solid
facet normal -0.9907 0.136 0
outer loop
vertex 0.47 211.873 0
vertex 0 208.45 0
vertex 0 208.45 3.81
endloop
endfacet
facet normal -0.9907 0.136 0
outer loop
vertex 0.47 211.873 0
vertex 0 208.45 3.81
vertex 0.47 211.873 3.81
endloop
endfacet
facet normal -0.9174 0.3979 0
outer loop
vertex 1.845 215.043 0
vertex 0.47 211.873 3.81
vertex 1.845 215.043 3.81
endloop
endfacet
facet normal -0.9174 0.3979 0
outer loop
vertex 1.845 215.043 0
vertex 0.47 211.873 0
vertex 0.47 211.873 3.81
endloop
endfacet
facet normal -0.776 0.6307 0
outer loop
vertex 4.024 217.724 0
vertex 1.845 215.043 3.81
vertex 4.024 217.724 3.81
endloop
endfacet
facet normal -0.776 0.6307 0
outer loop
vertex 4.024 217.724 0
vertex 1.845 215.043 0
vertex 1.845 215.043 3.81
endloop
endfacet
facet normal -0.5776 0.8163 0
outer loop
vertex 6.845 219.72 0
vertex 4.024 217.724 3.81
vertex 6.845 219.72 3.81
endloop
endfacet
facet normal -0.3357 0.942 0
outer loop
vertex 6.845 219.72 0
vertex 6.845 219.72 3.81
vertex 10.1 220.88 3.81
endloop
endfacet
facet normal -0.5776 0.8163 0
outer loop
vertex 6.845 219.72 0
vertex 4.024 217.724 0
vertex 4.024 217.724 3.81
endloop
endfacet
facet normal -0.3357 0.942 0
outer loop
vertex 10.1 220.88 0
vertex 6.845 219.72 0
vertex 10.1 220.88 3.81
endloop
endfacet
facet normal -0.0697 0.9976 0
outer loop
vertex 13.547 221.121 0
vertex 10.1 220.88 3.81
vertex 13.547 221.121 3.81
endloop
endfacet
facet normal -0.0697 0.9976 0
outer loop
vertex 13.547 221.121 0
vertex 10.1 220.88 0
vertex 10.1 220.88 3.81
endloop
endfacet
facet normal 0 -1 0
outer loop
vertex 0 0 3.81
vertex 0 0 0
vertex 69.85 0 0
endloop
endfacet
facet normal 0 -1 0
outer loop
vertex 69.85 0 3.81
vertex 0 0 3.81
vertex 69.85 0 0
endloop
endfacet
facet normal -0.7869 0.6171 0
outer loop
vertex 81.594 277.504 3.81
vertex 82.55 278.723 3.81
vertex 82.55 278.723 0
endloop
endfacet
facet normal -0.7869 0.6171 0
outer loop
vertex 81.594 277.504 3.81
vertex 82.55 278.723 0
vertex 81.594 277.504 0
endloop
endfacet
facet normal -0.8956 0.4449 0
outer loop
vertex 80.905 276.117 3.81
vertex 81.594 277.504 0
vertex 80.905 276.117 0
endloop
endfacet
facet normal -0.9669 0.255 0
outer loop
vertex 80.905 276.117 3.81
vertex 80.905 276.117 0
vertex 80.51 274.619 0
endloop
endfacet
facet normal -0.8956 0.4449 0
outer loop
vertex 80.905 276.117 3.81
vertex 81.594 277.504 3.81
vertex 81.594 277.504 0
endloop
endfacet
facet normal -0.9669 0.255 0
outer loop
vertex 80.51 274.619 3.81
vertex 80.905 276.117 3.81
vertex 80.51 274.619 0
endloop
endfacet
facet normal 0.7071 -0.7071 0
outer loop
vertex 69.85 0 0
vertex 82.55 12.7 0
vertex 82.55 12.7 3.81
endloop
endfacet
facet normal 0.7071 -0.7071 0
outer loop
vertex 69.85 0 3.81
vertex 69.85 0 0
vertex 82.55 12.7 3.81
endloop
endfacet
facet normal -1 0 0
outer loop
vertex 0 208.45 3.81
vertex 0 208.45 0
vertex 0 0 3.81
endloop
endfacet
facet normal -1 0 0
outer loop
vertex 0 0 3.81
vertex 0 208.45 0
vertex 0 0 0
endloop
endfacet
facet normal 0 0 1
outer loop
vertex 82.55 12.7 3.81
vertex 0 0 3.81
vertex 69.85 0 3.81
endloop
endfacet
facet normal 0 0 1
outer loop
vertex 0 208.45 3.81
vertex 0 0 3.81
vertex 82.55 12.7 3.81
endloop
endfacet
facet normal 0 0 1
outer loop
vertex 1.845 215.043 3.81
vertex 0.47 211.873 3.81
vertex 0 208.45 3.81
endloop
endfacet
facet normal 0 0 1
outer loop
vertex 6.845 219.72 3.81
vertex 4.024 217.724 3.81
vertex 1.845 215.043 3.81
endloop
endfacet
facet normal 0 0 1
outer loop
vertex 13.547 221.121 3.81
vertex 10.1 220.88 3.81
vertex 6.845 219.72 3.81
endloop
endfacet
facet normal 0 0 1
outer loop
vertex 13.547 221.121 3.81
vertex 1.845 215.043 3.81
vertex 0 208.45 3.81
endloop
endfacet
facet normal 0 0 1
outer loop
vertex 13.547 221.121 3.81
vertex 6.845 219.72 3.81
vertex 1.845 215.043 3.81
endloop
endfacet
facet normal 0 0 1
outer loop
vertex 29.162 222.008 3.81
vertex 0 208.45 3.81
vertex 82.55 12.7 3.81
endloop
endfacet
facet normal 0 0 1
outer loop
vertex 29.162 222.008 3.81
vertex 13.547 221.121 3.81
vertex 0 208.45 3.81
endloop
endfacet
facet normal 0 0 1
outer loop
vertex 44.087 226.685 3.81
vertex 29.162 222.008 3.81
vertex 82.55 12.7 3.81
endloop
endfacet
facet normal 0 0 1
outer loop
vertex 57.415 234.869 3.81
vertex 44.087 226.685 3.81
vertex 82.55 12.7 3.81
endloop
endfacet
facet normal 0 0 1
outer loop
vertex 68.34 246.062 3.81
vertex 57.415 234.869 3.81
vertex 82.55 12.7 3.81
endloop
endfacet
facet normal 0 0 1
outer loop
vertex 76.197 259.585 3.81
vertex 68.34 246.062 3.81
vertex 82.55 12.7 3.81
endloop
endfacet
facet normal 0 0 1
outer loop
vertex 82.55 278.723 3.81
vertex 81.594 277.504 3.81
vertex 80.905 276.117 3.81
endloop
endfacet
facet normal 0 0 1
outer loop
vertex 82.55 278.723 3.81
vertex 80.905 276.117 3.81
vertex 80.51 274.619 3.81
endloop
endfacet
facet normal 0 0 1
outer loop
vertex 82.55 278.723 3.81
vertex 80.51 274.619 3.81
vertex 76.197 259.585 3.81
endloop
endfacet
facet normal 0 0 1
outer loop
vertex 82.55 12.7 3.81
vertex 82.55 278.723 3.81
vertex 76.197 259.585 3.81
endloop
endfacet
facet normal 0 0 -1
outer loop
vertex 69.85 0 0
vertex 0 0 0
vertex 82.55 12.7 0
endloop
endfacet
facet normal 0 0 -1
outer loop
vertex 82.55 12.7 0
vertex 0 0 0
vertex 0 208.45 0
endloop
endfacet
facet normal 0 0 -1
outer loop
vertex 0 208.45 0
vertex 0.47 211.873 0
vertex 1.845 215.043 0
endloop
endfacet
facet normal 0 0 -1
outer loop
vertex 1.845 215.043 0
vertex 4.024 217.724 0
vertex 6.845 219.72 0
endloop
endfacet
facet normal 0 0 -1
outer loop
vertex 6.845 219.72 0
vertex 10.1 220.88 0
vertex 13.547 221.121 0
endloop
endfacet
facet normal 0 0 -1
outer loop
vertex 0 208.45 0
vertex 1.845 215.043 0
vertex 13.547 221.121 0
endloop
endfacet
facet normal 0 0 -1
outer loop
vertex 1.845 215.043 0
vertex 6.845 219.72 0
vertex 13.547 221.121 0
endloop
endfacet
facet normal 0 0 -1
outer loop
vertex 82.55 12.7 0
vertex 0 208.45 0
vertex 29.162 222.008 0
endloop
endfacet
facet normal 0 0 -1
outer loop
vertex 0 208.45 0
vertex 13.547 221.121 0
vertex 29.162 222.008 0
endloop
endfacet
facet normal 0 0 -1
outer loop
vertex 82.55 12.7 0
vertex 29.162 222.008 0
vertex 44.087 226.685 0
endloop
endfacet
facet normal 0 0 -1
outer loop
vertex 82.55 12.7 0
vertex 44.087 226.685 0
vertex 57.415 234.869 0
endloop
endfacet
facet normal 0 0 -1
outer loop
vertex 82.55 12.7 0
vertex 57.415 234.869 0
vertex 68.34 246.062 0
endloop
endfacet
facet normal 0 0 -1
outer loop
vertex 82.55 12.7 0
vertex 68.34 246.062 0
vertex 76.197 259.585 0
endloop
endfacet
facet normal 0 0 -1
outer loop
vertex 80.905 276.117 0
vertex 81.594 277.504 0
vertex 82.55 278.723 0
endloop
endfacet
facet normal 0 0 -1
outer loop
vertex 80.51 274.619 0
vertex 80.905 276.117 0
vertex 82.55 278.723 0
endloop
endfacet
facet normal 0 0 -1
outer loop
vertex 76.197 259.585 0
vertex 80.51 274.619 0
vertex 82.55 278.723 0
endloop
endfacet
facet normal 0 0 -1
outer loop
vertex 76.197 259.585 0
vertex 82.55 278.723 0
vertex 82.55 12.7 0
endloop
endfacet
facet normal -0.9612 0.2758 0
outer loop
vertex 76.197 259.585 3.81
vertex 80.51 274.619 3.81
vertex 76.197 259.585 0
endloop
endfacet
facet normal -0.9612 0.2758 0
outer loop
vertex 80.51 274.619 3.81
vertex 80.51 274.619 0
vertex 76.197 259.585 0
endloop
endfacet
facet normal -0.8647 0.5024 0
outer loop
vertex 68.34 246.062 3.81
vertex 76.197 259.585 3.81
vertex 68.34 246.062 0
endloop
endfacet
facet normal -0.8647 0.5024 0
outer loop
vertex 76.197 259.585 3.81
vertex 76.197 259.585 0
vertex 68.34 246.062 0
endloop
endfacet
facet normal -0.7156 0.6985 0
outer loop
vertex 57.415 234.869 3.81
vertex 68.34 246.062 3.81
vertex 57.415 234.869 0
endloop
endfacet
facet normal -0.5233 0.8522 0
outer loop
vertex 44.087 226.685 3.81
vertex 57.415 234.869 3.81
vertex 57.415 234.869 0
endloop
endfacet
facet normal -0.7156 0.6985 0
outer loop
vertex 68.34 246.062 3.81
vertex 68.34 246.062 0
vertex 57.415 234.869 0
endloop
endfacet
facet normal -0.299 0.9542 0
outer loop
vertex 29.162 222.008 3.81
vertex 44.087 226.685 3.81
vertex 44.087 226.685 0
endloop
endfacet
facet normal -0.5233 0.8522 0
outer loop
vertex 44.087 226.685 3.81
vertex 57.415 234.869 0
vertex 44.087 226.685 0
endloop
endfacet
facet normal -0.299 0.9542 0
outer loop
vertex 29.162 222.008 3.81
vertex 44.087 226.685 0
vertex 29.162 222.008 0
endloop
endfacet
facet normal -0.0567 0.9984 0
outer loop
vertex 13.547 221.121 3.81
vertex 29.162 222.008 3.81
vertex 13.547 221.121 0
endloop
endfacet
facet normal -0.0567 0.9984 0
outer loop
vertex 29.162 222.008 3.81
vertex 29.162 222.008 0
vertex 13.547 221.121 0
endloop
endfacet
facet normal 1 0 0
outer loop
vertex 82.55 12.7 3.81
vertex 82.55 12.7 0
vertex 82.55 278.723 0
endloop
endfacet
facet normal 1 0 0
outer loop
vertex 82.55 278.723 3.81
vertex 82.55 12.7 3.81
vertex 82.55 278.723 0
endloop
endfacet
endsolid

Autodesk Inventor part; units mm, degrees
ref_plane "YZ Plane" through (0, 0, 0) normal (1, 0, 0) x (0, 1, 0)
ref_plane "XZ Plane" through (0, 0, 0) normal (0, 1, 0) x (-1, 0, 0)
ref_plane "XY Plane" through (0, 0, 0) normal (0, 0, 1) x (1, 0, 0)
sketch "Sketch1" plane through (0, 0, 0) normal (0, 0, 1) x (1, 0, 0)
  line L0 (0, 0) -> (82.55, 0)
  line L1 (82.55, 0) -> (82.55, 304.8)
  line L2 (82.55, 304.8) -> (0, 304.8)
  line L3 (0, 304.8) -> (0, 0)
  dimension "d0" = 82.55
  dimension "d1" = 304.8
extrude "Extrusion1" add sketch "Sketch1" along normal blind 3.81
chamfer "Chamfer1" distance 12.7 angle 45 1 edges at (82.55, 0, 1.905)
hole "Hole1" at (17.78, 284.48, 3.81) direction (0, 0, -1) diameter 127 end through all
hole "Hole2" at (80.6545, 302.7787, 3.81) direction (0, 0, -1) diameter 48.26 end through all
fillet "Fillet1" radius 7.62 1 edges at (81.0119, 278.6513, 1.905)
fillet "Fillet2" radius 12.7 1 edges at (0, 223.52, 1.905)
properties part number "Backstopleft"
